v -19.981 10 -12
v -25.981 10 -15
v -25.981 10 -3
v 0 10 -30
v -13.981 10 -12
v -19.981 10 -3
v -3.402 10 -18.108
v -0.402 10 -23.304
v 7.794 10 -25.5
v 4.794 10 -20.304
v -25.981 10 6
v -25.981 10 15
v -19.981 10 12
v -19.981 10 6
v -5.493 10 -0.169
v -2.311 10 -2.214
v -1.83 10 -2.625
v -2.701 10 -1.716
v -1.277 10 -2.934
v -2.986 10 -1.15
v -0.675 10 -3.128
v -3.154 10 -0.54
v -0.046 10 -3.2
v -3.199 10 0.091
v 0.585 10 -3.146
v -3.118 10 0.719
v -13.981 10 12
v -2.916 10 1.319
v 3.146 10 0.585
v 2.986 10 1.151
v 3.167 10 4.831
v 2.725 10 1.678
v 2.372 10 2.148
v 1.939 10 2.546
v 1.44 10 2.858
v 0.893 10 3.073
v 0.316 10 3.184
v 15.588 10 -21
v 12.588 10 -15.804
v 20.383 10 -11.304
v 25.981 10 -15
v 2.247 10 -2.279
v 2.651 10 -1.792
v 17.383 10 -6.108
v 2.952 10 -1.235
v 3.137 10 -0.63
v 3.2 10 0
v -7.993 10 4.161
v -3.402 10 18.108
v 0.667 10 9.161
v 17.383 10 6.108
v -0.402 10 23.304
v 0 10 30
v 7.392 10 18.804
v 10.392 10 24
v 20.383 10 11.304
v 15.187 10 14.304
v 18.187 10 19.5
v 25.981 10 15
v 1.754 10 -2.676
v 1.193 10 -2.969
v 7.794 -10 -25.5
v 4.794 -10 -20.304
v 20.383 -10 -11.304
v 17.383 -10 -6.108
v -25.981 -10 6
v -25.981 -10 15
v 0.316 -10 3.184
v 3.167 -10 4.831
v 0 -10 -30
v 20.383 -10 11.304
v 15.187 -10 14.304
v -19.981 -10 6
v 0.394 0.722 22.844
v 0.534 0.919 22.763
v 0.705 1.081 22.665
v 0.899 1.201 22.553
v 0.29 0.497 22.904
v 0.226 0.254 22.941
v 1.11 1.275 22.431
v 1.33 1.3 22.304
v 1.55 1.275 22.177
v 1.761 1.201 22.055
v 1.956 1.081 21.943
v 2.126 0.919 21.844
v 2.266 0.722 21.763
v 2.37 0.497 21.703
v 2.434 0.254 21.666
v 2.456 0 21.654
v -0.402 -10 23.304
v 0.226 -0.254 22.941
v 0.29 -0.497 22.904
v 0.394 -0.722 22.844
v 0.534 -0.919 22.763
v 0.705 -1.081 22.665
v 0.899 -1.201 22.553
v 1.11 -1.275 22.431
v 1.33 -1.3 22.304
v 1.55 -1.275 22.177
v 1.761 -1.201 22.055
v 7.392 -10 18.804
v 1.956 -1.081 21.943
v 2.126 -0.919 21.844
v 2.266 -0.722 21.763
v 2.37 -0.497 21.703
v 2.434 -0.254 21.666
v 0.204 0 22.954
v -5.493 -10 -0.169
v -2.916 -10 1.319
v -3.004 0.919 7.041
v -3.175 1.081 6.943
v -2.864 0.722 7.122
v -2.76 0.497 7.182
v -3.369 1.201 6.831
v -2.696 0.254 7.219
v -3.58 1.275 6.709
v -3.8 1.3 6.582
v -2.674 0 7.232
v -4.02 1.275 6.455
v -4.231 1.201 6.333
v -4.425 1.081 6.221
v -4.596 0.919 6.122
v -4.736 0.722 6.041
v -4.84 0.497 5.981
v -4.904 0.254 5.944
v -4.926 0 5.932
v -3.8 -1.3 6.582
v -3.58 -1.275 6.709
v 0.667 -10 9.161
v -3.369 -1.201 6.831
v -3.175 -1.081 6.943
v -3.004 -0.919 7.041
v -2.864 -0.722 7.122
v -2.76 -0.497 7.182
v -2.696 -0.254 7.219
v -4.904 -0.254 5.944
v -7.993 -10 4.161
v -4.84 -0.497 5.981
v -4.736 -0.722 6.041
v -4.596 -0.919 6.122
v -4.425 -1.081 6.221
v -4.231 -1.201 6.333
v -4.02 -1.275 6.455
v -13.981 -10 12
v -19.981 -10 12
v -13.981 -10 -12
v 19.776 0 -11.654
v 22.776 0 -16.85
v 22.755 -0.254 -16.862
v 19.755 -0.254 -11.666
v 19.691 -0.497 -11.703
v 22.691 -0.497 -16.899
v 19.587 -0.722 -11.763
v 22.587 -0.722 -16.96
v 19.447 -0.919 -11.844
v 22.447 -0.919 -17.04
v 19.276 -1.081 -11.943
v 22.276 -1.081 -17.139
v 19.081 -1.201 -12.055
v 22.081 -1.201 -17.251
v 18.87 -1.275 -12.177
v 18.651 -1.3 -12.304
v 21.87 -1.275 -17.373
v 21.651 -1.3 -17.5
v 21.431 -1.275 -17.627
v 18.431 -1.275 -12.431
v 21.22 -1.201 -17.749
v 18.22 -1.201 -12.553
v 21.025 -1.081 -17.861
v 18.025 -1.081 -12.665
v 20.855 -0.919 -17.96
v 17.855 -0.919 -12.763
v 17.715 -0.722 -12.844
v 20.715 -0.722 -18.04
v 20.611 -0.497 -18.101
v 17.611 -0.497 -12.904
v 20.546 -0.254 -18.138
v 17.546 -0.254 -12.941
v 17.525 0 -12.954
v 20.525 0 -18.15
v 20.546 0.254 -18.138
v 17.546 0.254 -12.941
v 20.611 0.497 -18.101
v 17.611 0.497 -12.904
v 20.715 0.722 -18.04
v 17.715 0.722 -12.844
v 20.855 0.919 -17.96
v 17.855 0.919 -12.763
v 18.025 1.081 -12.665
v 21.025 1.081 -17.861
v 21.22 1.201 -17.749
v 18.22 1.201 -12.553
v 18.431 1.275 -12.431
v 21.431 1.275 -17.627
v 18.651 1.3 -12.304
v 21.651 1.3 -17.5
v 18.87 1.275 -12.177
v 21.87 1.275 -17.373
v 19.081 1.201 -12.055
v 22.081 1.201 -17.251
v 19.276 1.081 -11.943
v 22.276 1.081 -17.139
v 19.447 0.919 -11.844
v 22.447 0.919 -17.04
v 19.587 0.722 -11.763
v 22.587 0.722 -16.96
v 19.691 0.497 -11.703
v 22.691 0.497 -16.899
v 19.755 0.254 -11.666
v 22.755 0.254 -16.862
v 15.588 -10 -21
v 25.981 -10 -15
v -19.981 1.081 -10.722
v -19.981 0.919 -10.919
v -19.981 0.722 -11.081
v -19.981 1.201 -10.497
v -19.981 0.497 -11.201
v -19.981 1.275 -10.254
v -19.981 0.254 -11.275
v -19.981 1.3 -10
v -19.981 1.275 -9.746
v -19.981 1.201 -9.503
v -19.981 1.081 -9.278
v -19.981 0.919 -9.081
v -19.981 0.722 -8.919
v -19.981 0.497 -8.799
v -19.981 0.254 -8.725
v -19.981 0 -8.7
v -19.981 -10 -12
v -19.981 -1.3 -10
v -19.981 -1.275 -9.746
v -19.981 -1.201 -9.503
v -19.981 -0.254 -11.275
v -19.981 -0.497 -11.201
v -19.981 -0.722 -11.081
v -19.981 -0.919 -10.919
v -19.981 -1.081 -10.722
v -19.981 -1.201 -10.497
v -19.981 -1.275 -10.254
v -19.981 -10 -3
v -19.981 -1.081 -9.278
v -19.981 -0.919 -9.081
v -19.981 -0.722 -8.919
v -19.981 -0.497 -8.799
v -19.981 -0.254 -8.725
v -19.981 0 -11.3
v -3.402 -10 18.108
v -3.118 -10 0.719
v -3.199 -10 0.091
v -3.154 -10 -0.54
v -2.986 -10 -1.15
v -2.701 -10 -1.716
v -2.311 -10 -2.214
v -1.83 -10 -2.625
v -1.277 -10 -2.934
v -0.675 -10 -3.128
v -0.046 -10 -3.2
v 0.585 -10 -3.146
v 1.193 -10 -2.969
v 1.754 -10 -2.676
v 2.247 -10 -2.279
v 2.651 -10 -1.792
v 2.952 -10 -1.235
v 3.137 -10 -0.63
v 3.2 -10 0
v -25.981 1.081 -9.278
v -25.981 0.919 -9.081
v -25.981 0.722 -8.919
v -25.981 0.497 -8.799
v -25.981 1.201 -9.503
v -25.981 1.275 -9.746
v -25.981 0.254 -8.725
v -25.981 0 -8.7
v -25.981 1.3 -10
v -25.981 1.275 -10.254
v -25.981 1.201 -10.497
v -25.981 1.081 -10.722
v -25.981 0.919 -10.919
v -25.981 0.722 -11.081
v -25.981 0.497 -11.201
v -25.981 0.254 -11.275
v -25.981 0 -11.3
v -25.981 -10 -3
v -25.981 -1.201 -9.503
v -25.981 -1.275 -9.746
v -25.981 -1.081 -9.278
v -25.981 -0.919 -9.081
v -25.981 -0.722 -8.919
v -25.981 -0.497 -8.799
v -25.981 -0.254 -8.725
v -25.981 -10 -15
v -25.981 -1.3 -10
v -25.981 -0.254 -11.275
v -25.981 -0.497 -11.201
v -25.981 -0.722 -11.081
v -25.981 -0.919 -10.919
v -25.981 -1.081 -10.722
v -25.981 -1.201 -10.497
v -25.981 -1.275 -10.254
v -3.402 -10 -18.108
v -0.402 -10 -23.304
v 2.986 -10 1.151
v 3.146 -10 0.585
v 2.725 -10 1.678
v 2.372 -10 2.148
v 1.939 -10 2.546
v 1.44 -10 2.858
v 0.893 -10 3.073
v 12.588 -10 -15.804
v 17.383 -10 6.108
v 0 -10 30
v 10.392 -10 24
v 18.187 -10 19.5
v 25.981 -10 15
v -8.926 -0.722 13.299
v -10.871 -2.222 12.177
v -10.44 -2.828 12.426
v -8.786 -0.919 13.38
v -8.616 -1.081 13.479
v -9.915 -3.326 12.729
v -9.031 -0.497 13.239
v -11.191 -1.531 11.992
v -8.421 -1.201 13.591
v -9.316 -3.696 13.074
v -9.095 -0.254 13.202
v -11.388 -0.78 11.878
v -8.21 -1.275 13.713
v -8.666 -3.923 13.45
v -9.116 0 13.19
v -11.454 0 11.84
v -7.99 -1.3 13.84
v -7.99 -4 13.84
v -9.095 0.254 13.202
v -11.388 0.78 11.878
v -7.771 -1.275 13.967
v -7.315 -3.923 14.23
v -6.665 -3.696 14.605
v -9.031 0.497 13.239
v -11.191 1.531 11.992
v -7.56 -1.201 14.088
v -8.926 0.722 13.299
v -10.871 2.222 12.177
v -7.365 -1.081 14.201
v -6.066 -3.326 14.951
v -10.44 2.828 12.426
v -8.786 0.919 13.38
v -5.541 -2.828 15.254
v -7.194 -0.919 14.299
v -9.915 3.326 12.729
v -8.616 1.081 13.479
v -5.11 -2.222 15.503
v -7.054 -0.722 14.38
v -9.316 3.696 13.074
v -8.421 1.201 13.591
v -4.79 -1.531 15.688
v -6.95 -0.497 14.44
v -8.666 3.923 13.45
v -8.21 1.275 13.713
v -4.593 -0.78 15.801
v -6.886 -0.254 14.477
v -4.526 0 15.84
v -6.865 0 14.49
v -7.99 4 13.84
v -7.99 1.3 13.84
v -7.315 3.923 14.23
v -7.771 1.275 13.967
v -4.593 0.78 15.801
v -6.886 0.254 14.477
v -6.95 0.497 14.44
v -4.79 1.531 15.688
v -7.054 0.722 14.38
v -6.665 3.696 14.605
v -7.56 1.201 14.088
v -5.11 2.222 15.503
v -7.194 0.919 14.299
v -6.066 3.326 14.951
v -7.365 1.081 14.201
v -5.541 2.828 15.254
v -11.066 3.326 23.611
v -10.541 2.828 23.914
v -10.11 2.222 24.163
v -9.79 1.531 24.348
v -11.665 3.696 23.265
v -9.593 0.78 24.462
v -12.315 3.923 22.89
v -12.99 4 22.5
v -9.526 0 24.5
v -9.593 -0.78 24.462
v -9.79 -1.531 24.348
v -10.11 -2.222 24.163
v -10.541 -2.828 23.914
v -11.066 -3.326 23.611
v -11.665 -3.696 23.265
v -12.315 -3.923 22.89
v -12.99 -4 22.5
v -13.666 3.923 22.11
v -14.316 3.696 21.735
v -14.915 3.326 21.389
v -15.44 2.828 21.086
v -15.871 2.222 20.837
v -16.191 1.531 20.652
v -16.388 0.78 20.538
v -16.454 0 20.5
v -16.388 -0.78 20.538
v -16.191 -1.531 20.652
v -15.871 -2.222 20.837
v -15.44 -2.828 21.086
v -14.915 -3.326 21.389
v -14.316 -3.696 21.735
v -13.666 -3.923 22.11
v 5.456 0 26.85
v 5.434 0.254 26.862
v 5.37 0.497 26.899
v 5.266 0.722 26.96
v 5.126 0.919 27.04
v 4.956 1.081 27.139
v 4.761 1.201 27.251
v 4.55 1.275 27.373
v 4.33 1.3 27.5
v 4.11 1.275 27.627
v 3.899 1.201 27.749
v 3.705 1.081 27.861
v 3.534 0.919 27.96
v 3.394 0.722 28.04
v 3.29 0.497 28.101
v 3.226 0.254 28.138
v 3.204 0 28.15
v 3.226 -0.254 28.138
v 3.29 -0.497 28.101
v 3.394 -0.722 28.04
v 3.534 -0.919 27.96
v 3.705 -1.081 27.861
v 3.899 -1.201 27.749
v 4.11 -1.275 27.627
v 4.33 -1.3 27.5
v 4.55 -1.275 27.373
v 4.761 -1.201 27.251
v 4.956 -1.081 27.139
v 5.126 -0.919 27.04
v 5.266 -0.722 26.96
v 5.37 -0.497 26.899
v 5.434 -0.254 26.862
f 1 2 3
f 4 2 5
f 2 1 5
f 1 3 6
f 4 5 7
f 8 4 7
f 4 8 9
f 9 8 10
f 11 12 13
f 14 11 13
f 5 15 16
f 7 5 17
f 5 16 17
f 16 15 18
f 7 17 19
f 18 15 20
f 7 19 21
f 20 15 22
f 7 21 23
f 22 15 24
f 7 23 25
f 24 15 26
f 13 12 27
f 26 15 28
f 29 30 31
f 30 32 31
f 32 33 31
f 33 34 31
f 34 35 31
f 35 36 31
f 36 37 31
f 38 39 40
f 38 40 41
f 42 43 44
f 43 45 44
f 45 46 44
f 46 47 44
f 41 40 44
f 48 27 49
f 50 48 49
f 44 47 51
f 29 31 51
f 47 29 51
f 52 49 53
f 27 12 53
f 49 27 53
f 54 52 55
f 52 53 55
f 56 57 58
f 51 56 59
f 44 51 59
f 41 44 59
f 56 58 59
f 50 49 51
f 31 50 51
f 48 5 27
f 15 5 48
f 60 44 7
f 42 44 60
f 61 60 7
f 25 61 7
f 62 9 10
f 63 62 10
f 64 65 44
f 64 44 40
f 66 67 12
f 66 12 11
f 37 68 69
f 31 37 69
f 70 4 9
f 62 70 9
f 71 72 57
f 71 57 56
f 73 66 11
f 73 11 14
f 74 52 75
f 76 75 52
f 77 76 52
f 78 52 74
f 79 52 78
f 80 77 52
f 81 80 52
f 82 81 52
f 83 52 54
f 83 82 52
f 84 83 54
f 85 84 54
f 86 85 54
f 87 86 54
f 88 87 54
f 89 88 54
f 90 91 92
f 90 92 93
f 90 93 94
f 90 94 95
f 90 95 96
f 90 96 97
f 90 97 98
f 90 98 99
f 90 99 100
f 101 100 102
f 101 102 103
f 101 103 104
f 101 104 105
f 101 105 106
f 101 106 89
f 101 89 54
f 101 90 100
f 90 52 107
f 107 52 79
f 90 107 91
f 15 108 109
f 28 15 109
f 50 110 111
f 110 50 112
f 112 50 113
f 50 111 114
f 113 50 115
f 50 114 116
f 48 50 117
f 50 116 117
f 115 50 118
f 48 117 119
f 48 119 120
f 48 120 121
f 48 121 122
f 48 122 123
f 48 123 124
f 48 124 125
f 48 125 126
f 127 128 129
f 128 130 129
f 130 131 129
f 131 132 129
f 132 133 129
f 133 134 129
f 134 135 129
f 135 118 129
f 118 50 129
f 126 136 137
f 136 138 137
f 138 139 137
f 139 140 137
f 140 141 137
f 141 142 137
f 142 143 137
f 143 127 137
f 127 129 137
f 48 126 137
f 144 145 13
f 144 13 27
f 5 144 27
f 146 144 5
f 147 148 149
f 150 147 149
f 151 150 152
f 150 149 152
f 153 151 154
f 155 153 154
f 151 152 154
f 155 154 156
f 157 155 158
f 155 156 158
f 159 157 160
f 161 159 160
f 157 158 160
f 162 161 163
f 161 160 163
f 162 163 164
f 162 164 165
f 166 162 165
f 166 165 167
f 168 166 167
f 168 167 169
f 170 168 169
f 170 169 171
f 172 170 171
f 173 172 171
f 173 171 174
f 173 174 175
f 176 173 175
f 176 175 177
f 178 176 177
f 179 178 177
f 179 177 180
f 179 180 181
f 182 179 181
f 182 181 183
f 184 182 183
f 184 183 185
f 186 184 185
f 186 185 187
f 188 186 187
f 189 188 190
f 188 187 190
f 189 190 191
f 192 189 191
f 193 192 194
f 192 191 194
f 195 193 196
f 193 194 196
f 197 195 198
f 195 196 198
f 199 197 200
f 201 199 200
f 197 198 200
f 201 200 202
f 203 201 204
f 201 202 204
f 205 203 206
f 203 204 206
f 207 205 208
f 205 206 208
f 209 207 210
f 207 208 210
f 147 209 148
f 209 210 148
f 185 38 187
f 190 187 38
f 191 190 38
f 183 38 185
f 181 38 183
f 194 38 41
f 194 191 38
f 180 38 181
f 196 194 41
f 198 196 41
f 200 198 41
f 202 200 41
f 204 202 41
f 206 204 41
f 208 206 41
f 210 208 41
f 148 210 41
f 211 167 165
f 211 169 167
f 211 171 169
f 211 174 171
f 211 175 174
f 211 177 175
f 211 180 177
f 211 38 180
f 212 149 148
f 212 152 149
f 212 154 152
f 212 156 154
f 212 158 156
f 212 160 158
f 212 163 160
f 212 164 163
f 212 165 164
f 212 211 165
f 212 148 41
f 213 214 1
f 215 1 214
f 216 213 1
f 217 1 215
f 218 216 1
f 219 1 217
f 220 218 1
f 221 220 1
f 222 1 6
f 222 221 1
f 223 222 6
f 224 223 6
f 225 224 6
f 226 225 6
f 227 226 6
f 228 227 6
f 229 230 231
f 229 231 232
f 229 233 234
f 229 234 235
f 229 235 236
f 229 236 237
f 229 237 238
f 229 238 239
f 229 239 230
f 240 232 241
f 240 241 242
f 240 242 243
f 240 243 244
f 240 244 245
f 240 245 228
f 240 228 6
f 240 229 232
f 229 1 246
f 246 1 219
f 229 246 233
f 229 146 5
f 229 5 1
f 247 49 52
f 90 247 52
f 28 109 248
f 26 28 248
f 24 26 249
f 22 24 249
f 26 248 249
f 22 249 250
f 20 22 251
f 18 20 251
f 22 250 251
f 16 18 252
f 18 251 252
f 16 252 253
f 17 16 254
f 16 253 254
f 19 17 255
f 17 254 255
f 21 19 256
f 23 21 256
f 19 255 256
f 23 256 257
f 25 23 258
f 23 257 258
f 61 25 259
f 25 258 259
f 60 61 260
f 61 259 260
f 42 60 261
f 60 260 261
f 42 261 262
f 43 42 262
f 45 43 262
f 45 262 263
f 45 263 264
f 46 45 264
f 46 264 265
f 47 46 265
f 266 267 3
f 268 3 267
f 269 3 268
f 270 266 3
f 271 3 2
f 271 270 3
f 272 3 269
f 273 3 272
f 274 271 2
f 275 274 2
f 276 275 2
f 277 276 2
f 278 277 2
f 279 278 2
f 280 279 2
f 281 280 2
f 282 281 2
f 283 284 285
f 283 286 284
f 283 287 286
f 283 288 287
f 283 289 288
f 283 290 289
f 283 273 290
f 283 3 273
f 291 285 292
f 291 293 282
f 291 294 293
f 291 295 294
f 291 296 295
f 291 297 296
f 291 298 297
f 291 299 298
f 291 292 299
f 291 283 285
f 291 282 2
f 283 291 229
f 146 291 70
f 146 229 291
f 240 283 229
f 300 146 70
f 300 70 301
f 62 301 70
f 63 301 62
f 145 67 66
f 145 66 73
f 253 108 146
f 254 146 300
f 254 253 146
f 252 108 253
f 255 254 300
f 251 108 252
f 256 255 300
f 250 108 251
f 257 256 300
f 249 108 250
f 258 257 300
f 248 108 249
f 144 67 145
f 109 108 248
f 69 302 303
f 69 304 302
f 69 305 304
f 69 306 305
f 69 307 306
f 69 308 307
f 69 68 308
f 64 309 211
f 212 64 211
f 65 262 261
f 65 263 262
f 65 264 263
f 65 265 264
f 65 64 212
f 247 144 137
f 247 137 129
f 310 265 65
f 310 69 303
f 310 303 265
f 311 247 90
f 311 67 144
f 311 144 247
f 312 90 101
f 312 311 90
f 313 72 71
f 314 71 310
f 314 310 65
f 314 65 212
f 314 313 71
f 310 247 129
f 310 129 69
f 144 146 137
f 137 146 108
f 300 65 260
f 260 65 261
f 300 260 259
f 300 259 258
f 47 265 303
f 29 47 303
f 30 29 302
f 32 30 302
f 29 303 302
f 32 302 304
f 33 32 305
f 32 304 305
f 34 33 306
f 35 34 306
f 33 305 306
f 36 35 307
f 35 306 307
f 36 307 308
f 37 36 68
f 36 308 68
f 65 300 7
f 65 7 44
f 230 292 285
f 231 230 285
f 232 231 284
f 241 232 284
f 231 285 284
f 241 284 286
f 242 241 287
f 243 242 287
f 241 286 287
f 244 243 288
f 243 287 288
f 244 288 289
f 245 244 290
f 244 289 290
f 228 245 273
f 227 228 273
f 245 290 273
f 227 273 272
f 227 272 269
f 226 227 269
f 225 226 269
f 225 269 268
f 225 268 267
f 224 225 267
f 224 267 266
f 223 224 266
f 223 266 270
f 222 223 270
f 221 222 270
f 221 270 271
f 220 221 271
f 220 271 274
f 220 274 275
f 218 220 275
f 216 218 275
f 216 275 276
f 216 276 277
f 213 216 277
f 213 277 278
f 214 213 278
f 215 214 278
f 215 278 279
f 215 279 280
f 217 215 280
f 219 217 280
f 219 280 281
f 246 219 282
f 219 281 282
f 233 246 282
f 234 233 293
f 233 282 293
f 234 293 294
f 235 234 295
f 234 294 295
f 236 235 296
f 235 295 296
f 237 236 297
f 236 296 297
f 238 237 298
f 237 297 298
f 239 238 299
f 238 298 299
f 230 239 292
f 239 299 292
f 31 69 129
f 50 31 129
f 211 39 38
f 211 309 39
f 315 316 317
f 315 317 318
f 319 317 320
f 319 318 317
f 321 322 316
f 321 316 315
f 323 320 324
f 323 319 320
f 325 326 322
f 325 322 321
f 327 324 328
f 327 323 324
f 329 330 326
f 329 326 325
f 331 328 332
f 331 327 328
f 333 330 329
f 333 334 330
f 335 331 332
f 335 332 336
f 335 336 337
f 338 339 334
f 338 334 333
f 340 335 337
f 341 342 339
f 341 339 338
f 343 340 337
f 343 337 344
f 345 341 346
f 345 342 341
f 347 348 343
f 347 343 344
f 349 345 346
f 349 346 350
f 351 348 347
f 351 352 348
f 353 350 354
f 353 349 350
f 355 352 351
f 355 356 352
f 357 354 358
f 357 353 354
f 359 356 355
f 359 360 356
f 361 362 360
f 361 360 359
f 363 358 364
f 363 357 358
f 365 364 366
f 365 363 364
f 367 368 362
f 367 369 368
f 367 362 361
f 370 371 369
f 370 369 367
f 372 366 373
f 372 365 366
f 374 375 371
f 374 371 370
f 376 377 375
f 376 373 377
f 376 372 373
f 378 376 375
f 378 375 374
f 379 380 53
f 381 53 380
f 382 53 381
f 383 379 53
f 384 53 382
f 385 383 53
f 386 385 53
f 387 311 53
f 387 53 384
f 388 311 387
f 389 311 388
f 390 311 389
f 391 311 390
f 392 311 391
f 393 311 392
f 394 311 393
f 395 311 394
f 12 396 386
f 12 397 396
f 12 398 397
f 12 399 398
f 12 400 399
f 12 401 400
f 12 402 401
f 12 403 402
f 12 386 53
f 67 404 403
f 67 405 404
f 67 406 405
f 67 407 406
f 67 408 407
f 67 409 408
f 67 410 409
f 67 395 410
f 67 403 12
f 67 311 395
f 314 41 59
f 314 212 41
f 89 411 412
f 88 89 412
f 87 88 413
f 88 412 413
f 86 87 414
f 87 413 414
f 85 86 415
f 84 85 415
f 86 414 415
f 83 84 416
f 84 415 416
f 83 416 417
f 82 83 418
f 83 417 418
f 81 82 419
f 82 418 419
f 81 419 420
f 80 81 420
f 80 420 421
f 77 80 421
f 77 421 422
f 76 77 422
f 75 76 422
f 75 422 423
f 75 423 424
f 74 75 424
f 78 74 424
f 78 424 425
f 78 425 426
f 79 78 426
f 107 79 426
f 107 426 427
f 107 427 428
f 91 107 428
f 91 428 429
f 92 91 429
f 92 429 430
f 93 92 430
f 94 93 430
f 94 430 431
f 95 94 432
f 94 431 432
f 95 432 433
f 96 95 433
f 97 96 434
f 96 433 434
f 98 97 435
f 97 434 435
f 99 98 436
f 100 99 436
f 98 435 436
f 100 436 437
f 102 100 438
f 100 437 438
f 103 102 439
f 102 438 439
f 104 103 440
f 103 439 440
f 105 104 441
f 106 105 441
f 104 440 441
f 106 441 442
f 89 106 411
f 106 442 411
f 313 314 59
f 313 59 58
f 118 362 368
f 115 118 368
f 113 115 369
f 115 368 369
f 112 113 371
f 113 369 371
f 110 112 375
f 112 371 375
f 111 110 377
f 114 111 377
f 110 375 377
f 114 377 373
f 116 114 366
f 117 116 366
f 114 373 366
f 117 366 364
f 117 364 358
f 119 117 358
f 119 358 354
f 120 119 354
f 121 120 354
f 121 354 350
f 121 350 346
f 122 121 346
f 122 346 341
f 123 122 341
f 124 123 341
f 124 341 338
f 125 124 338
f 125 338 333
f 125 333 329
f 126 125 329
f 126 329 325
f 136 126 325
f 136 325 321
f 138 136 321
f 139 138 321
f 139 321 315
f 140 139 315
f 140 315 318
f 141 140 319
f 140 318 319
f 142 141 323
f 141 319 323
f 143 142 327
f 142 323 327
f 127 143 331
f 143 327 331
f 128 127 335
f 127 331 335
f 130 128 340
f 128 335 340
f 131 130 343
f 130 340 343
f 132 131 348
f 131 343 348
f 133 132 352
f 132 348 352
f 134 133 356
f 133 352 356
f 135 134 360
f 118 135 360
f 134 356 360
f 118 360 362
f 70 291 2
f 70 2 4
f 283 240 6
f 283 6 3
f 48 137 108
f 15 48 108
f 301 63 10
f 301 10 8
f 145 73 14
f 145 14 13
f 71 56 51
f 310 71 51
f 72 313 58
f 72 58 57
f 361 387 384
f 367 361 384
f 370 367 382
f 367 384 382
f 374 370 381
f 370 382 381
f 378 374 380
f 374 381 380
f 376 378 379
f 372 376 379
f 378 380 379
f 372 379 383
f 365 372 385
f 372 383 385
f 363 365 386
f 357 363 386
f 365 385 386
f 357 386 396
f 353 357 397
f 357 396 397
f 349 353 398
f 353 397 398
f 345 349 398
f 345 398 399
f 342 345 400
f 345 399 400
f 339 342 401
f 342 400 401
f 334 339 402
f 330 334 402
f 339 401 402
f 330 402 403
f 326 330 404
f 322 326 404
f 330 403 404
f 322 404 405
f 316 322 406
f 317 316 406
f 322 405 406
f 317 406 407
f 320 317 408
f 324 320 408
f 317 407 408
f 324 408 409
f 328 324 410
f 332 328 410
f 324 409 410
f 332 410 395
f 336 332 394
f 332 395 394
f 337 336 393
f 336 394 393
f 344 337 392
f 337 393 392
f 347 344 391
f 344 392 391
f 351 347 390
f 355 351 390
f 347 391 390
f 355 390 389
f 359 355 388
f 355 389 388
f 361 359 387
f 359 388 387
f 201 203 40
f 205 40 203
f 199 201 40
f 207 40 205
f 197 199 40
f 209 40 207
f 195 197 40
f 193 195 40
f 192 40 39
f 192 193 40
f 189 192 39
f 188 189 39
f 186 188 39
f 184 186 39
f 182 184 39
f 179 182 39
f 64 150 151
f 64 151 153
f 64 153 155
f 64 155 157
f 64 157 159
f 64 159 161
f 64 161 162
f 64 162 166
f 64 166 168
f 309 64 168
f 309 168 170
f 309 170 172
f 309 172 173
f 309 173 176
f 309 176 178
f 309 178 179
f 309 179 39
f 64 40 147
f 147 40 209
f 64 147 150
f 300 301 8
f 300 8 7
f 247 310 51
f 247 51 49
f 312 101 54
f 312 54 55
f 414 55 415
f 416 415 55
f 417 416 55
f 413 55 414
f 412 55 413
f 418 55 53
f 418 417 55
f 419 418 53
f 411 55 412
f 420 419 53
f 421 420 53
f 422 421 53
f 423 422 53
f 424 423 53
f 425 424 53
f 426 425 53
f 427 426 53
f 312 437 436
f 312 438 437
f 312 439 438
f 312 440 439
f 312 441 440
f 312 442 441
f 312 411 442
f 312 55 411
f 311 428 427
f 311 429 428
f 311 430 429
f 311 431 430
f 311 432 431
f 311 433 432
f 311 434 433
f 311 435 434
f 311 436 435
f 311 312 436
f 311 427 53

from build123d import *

# Parameters (mm, degrees)
F1_DEPTH  = 10
F3_DEPTH  = 20
F4_R      = 1.3
F5_DEPTH  = 25
F4_R_2    = 4
F6_DEPTH  = 10
F8_R      = 1.3
F9_DEPTH  = 8
F7_R      = 1.3
F10_DEPTH = 8
F11_R     = 1.3
F12_DEPTH = 8


with BuildPart() as f1:
    # F0 (on Front) → F1 (new body, symmetric)
    with BuildSketch(Plane.XZ):
        Polygon((25.9807621135, -15), (25.9807621135, 15), (18.1865334795, 19.5), (15.1865334795, 14.3038475773), (20.3826859022, 11.3038475773), (17.3826859022, 6.1076951546), (-3.4019237886, 18.1076951546), (-0.4019237886, 23.3038475773), (7.3923048454, 18.8038475773), (10.3923048454, 24), (0, 30), (-25.9807621135, 15), (-25.9807621135, 6), (-19.9807621135, 6), (-19.9807621135, 12), (-13.9807621135, 12), (-13.9807621135, -12), (-19.9807621135, -12), (-19.9807621135, -3), (-25.9807621135, -3), (-25.9807621135, -15), (0, -30), (7.7942286341, -25.5), (4.7942286341, -20.3038475773), (-0.4019237886, -23.3038475773), (-3.4019237886, -18.1076951546), (17.3826859022, -6.1076951546), (20.3826859022, -11.3038475773), (12.5884572681, -15.8038475773), (15.5884572681, -21), align=None)
    extrude(amount=F1_DEPTH, both=True)

    # F2 (on face) → F3 (cut)
    with BuildSketch(Plane.XZ.offset(10)):
        with BuildLine():
            ThreePointArc((-2.9155494421, 1.3189281445), (-0.6746264837, -3.1280791402), (3.2, 0))
            ThreePointArc((3.2, 0), (2.3716827586, 2.1482832431), (0.3155494421, 3.1844039551))
            ThreePointArc((0.3155494421, 3.1844039551), (-1.6, 2.7712812921), (-2.9155494421, 1.3189281445))
        make_face()
        with BuildLine():
            ThreePointArc((-2.9155494421, 1.3189281445), (-1.6, 2.7712812921), (0.3155494421, 3.1844039551))
            Line((0.3155494421, 3.1844039551), (3.1670527423, 4.8307201531))
            Line((3.1670527423, 4.8307201531), (0.6670527423, 9.160847172))
            Line((0.6670527423, 9.160847172), (-7.9932012956, 4.160847172))
            Line((-7.9932012956, 4.160847172), (-5.4932012956, -0.1692798469))
            Line((-5.4932012956, -0.1692798469), (-2.9155494421, 1.3189281445))
        make_face()
    extrude(amount=-F3_DEPTH, mode=Mode.SUBTRACT)

    # F4 (on face) → F5 (cut)
    with BuildSketch(Plane(origin=(-12.9903810568, 0, 22.5), x_dir=(0.8660254038, 0, 0.5), z_dir=(-0.5, 0, 0.8660254038))):
        Circle(F4_R)
    extrude(amount=-F5_DEPTH, mode=Mode.SUBTRACT)

    # F4 (on face) → F6 (cut)
    with BuildSketch(Plane(origin=(-12.9903810568, 0, 22.5), x_dir=(0.8660254038, 0, 0.5), z_dir=(-0.5, 0, 0.8660254038))):
        Circle(F4_R_2)
        Circle(F4_R, mode=Mode.SUBTRACT)
    extrude(amount=-F6_DEPTH, mode=Mode.SUBTRACT)

    # F8 (on face) → F9 (cut)
    with BuildSketch(Plane(origin=(12.9903810568, 0, 22.5), x_dir=(0.8660254038, 0, -0.5), z_dir=(0.5, 0, 0.8660254038))):
        with Locations((-10, 0)):
            Circle(F8_R)
    extrude(amount=-F9_DEPTH, mode=Mode.SUBTRACT)

    # F7 (on face) → F10 (cut)
    with BuildSketch(Plane(origin=(12.9903810568, 0, -22.5), x_dir=(0.8660254038, 0, 0.5), z_dir=(0.5, 0, -0.8660254038))):
        with Locations((10, 0)):
            Circle(F7_R)
    extrude(amount=-F10_DEPTH, mode=Mode.SUBTRACT)

    # F11 (on face) → F12 (cut)
    with BuildSketch(Plane(origin=(-25.9807621135, 0, 0), x_dir=(0, -1, 0), z_dir=(-1, 0, 0))):
        with Locations((0, -10)):
            Circle(F11_R)
    extrude(amount=-F12_DEPTH, mode=Mode.SUBTRACT)


solid = f1.part
